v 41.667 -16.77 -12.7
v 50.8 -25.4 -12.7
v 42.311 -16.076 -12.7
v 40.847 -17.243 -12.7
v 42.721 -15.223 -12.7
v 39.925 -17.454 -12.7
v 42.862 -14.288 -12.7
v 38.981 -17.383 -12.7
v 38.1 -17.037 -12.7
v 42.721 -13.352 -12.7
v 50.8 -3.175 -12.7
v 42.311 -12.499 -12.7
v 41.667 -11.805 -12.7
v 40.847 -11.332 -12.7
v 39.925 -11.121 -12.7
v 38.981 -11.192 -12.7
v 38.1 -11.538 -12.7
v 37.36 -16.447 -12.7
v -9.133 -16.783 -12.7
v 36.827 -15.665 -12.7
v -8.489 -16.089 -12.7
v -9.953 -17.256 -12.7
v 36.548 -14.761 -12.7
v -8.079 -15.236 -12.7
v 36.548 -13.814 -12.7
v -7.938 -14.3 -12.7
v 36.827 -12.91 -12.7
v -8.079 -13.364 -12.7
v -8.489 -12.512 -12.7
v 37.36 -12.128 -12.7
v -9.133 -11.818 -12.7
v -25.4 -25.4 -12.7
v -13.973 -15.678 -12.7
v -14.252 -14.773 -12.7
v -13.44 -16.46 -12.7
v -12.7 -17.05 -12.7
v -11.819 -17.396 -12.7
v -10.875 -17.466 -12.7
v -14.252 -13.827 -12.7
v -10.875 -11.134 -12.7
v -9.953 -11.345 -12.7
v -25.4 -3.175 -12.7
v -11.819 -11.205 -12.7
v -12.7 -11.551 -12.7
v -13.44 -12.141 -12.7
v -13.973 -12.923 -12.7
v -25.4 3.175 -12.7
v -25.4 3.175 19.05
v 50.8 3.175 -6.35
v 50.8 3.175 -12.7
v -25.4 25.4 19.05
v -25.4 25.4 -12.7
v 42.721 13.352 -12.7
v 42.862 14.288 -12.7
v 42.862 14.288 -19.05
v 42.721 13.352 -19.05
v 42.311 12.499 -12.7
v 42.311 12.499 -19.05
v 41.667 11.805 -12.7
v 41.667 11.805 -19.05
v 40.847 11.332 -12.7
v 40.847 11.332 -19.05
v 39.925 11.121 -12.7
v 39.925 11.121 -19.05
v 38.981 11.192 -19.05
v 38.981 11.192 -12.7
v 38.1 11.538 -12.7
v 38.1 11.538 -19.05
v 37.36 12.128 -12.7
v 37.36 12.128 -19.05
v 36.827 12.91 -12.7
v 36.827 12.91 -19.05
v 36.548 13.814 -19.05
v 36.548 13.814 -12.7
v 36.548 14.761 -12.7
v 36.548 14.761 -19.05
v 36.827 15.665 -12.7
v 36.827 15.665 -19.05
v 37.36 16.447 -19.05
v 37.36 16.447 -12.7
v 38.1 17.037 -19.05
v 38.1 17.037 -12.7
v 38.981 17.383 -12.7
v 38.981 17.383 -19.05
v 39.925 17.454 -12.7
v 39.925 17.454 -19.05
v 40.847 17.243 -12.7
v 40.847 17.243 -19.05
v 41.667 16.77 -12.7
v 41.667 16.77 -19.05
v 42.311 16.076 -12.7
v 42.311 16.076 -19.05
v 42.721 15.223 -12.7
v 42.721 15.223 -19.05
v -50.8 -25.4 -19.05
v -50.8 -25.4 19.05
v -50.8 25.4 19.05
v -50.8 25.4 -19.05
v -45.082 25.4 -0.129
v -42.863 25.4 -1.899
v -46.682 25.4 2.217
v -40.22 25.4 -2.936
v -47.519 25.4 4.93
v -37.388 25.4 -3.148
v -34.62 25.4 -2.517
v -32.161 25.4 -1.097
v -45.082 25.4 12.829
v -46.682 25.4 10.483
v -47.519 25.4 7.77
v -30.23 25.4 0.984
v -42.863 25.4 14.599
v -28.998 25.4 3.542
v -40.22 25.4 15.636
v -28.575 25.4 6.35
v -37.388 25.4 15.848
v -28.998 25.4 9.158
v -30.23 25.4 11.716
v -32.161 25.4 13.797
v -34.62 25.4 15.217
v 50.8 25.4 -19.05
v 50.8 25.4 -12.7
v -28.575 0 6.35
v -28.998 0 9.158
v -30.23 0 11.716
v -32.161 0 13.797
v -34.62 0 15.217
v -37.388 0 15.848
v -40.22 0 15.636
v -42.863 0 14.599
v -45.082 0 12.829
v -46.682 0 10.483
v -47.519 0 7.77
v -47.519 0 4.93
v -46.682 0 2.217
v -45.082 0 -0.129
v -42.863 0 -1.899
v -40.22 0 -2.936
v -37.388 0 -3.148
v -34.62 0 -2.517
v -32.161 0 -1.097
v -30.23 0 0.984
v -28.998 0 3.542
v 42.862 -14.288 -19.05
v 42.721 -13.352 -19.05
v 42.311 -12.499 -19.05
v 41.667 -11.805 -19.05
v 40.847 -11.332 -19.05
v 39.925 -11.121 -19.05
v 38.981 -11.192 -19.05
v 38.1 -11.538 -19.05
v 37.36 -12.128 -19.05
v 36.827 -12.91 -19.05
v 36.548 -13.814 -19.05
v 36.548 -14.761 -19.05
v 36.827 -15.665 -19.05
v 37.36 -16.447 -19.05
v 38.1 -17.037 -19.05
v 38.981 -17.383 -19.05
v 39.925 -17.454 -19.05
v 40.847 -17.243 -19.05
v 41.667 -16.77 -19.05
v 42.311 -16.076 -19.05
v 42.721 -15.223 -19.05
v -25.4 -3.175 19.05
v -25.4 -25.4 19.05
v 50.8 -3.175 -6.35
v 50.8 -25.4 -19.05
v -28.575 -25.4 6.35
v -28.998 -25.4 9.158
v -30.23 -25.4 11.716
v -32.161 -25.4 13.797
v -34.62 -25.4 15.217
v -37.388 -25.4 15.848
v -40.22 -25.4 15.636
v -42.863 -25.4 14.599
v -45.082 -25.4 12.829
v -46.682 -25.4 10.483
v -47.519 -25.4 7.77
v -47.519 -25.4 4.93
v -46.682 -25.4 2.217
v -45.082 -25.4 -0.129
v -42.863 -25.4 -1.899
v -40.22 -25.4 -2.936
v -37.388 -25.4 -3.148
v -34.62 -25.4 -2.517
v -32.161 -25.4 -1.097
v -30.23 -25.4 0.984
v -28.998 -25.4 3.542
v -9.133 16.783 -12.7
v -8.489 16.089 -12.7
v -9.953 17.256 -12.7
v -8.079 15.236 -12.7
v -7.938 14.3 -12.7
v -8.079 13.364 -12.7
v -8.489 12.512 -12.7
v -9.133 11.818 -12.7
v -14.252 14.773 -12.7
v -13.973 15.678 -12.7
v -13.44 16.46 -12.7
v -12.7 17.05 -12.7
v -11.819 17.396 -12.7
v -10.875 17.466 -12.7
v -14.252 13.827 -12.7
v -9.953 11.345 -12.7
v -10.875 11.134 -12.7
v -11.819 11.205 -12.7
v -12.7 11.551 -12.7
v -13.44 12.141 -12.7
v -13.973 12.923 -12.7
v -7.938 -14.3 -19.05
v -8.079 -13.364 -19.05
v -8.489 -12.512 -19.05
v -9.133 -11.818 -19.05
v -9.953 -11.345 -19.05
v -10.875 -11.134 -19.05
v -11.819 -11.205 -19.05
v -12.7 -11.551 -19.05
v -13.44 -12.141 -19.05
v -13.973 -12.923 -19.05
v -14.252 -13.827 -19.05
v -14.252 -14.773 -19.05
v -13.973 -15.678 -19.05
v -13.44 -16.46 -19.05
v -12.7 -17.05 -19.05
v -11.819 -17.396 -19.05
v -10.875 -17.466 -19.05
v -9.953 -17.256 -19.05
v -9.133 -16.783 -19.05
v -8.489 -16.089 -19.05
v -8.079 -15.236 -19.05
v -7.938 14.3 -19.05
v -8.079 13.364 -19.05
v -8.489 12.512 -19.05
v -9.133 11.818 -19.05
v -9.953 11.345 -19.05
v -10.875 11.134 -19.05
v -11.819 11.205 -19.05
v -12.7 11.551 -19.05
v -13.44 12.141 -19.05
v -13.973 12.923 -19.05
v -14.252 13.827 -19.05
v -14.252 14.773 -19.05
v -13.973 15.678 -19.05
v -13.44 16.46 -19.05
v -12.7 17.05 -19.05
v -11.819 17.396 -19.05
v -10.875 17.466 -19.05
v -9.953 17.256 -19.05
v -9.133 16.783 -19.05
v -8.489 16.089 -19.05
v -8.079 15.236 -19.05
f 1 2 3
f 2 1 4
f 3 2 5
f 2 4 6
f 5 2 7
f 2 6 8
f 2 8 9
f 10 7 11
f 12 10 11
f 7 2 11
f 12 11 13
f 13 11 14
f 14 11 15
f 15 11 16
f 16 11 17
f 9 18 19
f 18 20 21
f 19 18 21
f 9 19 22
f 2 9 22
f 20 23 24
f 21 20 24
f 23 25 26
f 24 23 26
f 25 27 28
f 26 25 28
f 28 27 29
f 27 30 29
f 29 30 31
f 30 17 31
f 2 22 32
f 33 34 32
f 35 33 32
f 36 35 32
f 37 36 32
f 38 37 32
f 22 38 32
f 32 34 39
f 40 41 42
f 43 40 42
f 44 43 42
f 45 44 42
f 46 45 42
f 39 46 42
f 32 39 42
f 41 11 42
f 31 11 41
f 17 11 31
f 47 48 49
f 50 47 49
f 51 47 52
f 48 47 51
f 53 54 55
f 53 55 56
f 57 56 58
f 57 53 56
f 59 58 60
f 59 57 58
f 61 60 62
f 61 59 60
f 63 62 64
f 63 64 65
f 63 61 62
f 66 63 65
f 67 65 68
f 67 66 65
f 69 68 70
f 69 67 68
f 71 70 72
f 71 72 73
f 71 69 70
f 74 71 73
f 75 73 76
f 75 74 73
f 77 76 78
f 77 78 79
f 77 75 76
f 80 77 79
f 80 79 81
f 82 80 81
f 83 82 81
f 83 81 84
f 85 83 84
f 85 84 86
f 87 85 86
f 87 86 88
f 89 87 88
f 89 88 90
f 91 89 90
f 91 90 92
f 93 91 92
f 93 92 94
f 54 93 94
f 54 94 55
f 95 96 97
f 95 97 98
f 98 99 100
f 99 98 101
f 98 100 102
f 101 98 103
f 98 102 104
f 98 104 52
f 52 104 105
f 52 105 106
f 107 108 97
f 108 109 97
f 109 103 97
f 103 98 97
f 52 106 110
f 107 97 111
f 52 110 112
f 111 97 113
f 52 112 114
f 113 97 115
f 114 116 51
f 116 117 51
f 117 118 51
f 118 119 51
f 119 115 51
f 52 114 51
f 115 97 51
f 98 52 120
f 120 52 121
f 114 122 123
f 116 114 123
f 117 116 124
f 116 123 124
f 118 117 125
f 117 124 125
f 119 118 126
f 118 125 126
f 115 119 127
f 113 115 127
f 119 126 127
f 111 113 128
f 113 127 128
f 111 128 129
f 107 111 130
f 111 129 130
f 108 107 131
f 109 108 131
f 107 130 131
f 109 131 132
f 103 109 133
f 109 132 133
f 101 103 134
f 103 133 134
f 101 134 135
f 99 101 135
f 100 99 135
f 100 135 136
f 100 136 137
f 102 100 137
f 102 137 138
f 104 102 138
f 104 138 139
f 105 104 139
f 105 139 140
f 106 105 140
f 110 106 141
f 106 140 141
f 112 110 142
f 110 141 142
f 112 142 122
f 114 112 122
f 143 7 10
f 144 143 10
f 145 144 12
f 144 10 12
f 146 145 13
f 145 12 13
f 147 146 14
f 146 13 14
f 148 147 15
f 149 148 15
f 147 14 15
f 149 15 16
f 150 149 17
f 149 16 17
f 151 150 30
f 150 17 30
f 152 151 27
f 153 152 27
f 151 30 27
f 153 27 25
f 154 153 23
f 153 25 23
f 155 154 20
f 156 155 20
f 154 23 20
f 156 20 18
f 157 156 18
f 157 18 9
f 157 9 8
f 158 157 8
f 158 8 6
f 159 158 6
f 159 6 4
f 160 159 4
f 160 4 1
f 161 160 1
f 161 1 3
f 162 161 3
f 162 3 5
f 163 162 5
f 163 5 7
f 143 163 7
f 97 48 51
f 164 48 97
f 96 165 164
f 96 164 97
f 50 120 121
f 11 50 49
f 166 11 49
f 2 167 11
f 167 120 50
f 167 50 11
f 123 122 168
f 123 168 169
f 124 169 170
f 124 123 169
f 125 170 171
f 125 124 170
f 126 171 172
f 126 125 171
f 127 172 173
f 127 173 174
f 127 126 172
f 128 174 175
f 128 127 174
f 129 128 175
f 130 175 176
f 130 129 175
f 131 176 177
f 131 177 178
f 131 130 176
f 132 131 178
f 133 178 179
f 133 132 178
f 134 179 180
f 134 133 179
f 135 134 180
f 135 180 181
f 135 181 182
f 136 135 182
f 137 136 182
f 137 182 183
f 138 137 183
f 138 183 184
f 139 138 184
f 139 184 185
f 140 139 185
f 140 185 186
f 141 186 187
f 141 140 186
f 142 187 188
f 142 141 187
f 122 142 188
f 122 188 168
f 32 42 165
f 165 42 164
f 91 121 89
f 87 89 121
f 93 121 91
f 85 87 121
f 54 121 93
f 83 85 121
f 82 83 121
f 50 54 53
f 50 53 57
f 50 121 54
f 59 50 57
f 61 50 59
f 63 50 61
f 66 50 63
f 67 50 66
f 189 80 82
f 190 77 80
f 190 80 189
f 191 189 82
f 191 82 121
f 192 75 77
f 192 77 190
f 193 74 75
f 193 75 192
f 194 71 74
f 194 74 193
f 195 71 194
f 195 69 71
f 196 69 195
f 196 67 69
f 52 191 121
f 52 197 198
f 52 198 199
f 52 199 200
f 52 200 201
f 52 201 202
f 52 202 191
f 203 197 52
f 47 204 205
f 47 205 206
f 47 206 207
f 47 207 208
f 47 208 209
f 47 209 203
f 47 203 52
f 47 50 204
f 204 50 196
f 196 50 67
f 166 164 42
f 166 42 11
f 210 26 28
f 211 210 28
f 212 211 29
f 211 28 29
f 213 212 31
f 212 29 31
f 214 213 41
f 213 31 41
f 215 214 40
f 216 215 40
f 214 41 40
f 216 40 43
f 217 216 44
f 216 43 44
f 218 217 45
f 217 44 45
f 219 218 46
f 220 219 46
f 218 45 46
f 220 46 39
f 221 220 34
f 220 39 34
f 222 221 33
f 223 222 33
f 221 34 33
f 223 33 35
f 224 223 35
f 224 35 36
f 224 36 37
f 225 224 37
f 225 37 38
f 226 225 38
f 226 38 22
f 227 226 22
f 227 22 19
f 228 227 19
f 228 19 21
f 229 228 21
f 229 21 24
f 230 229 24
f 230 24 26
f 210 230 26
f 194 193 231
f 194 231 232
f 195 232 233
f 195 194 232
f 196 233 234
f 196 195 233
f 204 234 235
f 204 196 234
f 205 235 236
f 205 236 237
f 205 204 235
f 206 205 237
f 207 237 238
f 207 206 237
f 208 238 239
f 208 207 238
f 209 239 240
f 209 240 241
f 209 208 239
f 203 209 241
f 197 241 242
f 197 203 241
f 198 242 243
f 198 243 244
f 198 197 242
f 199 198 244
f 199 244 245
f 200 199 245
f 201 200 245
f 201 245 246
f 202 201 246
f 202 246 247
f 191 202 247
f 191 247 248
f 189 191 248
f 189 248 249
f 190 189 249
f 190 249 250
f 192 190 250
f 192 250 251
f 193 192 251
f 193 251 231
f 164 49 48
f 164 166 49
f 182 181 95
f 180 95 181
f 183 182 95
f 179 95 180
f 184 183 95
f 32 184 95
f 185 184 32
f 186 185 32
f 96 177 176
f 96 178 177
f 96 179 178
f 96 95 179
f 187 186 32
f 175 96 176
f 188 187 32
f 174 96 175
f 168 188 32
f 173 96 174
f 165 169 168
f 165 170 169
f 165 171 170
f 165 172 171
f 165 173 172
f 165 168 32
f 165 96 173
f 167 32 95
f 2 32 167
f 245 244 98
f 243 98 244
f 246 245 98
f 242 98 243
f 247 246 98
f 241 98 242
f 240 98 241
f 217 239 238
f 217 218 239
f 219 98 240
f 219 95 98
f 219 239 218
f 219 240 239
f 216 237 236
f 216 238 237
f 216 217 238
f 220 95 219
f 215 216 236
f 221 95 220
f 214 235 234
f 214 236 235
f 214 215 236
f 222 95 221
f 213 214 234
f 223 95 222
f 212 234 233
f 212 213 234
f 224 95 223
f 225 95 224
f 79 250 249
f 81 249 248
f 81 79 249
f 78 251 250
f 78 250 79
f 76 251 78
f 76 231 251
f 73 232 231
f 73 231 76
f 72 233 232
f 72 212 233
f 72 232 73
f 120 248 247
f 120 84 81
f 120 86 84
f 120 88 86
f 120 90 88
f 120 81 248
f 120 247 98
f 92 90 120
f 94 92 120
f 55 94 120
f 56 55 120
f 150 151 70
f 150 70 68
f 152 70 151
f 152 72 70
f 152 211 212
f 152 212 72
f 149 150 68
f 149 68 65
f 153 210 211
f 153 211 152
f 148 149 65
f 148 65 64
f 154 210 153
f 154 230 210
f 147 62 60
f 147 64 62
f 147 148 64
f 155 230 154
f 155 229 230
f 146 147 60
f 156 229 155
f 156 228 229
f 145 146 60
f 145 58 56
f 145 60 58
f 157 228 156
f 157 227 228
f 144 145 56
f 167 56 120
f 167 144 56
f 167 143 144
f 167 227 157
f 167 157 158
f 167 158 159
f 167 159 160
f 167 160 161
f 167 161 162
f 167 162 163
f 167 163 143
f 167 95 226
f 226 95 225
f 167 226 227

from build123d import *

# Parameters (mm, degrees)
F0_R     = 9.525
F1_DEPTH = 25.4
F3_DEPTH = 3.175
F4_R     = 3.175
F5_DEPTH = 25.4


with BuildPart() as f1:
    # F0 (on Front) → F1 (new body)
    with BuildSketch(Plane.XZ):
        Polygon((-25.4, -12.7), (-25.4, 19.05), (-50.8, 19.05), (-50.8, -19.05), (50.8, -19.05), (50.8, -12.7), align=None)
        with Locations((-38.1, 6.35)):
            Circle(F0_R, mode=Mode.SUBTRACT)
    extrude(amount=F1_DEPTH)

    # F2 (on Front) → F3 (join)
    with BuildSketch(Plane.XZ):
        Polygon((50.8, -6.35), (-25.4, 19.05), (-25.4, -12.7), (50.8, -12.7), align=None)
    extrude(amount=F3_DEPTH)

    # F4 (on face) → F5 (cut)
    with BuildSketch(Plane.XY.offset(-12.7)):
        with Locations((39.6875, -14.2875)):
            Circle(F4_R)
        with Locations((-11.1125, -14.3002)):
            Circle(F4_R)
    extrude(amount=-F5_DEPTH, mode=Mode.SUBTRACT)

    # F6: F1 across plane


with BuildPart() as f1_1:
    add(f1.part)
    add(f1.part.mirror(Plane.XZ))


solid = f1_1.part
